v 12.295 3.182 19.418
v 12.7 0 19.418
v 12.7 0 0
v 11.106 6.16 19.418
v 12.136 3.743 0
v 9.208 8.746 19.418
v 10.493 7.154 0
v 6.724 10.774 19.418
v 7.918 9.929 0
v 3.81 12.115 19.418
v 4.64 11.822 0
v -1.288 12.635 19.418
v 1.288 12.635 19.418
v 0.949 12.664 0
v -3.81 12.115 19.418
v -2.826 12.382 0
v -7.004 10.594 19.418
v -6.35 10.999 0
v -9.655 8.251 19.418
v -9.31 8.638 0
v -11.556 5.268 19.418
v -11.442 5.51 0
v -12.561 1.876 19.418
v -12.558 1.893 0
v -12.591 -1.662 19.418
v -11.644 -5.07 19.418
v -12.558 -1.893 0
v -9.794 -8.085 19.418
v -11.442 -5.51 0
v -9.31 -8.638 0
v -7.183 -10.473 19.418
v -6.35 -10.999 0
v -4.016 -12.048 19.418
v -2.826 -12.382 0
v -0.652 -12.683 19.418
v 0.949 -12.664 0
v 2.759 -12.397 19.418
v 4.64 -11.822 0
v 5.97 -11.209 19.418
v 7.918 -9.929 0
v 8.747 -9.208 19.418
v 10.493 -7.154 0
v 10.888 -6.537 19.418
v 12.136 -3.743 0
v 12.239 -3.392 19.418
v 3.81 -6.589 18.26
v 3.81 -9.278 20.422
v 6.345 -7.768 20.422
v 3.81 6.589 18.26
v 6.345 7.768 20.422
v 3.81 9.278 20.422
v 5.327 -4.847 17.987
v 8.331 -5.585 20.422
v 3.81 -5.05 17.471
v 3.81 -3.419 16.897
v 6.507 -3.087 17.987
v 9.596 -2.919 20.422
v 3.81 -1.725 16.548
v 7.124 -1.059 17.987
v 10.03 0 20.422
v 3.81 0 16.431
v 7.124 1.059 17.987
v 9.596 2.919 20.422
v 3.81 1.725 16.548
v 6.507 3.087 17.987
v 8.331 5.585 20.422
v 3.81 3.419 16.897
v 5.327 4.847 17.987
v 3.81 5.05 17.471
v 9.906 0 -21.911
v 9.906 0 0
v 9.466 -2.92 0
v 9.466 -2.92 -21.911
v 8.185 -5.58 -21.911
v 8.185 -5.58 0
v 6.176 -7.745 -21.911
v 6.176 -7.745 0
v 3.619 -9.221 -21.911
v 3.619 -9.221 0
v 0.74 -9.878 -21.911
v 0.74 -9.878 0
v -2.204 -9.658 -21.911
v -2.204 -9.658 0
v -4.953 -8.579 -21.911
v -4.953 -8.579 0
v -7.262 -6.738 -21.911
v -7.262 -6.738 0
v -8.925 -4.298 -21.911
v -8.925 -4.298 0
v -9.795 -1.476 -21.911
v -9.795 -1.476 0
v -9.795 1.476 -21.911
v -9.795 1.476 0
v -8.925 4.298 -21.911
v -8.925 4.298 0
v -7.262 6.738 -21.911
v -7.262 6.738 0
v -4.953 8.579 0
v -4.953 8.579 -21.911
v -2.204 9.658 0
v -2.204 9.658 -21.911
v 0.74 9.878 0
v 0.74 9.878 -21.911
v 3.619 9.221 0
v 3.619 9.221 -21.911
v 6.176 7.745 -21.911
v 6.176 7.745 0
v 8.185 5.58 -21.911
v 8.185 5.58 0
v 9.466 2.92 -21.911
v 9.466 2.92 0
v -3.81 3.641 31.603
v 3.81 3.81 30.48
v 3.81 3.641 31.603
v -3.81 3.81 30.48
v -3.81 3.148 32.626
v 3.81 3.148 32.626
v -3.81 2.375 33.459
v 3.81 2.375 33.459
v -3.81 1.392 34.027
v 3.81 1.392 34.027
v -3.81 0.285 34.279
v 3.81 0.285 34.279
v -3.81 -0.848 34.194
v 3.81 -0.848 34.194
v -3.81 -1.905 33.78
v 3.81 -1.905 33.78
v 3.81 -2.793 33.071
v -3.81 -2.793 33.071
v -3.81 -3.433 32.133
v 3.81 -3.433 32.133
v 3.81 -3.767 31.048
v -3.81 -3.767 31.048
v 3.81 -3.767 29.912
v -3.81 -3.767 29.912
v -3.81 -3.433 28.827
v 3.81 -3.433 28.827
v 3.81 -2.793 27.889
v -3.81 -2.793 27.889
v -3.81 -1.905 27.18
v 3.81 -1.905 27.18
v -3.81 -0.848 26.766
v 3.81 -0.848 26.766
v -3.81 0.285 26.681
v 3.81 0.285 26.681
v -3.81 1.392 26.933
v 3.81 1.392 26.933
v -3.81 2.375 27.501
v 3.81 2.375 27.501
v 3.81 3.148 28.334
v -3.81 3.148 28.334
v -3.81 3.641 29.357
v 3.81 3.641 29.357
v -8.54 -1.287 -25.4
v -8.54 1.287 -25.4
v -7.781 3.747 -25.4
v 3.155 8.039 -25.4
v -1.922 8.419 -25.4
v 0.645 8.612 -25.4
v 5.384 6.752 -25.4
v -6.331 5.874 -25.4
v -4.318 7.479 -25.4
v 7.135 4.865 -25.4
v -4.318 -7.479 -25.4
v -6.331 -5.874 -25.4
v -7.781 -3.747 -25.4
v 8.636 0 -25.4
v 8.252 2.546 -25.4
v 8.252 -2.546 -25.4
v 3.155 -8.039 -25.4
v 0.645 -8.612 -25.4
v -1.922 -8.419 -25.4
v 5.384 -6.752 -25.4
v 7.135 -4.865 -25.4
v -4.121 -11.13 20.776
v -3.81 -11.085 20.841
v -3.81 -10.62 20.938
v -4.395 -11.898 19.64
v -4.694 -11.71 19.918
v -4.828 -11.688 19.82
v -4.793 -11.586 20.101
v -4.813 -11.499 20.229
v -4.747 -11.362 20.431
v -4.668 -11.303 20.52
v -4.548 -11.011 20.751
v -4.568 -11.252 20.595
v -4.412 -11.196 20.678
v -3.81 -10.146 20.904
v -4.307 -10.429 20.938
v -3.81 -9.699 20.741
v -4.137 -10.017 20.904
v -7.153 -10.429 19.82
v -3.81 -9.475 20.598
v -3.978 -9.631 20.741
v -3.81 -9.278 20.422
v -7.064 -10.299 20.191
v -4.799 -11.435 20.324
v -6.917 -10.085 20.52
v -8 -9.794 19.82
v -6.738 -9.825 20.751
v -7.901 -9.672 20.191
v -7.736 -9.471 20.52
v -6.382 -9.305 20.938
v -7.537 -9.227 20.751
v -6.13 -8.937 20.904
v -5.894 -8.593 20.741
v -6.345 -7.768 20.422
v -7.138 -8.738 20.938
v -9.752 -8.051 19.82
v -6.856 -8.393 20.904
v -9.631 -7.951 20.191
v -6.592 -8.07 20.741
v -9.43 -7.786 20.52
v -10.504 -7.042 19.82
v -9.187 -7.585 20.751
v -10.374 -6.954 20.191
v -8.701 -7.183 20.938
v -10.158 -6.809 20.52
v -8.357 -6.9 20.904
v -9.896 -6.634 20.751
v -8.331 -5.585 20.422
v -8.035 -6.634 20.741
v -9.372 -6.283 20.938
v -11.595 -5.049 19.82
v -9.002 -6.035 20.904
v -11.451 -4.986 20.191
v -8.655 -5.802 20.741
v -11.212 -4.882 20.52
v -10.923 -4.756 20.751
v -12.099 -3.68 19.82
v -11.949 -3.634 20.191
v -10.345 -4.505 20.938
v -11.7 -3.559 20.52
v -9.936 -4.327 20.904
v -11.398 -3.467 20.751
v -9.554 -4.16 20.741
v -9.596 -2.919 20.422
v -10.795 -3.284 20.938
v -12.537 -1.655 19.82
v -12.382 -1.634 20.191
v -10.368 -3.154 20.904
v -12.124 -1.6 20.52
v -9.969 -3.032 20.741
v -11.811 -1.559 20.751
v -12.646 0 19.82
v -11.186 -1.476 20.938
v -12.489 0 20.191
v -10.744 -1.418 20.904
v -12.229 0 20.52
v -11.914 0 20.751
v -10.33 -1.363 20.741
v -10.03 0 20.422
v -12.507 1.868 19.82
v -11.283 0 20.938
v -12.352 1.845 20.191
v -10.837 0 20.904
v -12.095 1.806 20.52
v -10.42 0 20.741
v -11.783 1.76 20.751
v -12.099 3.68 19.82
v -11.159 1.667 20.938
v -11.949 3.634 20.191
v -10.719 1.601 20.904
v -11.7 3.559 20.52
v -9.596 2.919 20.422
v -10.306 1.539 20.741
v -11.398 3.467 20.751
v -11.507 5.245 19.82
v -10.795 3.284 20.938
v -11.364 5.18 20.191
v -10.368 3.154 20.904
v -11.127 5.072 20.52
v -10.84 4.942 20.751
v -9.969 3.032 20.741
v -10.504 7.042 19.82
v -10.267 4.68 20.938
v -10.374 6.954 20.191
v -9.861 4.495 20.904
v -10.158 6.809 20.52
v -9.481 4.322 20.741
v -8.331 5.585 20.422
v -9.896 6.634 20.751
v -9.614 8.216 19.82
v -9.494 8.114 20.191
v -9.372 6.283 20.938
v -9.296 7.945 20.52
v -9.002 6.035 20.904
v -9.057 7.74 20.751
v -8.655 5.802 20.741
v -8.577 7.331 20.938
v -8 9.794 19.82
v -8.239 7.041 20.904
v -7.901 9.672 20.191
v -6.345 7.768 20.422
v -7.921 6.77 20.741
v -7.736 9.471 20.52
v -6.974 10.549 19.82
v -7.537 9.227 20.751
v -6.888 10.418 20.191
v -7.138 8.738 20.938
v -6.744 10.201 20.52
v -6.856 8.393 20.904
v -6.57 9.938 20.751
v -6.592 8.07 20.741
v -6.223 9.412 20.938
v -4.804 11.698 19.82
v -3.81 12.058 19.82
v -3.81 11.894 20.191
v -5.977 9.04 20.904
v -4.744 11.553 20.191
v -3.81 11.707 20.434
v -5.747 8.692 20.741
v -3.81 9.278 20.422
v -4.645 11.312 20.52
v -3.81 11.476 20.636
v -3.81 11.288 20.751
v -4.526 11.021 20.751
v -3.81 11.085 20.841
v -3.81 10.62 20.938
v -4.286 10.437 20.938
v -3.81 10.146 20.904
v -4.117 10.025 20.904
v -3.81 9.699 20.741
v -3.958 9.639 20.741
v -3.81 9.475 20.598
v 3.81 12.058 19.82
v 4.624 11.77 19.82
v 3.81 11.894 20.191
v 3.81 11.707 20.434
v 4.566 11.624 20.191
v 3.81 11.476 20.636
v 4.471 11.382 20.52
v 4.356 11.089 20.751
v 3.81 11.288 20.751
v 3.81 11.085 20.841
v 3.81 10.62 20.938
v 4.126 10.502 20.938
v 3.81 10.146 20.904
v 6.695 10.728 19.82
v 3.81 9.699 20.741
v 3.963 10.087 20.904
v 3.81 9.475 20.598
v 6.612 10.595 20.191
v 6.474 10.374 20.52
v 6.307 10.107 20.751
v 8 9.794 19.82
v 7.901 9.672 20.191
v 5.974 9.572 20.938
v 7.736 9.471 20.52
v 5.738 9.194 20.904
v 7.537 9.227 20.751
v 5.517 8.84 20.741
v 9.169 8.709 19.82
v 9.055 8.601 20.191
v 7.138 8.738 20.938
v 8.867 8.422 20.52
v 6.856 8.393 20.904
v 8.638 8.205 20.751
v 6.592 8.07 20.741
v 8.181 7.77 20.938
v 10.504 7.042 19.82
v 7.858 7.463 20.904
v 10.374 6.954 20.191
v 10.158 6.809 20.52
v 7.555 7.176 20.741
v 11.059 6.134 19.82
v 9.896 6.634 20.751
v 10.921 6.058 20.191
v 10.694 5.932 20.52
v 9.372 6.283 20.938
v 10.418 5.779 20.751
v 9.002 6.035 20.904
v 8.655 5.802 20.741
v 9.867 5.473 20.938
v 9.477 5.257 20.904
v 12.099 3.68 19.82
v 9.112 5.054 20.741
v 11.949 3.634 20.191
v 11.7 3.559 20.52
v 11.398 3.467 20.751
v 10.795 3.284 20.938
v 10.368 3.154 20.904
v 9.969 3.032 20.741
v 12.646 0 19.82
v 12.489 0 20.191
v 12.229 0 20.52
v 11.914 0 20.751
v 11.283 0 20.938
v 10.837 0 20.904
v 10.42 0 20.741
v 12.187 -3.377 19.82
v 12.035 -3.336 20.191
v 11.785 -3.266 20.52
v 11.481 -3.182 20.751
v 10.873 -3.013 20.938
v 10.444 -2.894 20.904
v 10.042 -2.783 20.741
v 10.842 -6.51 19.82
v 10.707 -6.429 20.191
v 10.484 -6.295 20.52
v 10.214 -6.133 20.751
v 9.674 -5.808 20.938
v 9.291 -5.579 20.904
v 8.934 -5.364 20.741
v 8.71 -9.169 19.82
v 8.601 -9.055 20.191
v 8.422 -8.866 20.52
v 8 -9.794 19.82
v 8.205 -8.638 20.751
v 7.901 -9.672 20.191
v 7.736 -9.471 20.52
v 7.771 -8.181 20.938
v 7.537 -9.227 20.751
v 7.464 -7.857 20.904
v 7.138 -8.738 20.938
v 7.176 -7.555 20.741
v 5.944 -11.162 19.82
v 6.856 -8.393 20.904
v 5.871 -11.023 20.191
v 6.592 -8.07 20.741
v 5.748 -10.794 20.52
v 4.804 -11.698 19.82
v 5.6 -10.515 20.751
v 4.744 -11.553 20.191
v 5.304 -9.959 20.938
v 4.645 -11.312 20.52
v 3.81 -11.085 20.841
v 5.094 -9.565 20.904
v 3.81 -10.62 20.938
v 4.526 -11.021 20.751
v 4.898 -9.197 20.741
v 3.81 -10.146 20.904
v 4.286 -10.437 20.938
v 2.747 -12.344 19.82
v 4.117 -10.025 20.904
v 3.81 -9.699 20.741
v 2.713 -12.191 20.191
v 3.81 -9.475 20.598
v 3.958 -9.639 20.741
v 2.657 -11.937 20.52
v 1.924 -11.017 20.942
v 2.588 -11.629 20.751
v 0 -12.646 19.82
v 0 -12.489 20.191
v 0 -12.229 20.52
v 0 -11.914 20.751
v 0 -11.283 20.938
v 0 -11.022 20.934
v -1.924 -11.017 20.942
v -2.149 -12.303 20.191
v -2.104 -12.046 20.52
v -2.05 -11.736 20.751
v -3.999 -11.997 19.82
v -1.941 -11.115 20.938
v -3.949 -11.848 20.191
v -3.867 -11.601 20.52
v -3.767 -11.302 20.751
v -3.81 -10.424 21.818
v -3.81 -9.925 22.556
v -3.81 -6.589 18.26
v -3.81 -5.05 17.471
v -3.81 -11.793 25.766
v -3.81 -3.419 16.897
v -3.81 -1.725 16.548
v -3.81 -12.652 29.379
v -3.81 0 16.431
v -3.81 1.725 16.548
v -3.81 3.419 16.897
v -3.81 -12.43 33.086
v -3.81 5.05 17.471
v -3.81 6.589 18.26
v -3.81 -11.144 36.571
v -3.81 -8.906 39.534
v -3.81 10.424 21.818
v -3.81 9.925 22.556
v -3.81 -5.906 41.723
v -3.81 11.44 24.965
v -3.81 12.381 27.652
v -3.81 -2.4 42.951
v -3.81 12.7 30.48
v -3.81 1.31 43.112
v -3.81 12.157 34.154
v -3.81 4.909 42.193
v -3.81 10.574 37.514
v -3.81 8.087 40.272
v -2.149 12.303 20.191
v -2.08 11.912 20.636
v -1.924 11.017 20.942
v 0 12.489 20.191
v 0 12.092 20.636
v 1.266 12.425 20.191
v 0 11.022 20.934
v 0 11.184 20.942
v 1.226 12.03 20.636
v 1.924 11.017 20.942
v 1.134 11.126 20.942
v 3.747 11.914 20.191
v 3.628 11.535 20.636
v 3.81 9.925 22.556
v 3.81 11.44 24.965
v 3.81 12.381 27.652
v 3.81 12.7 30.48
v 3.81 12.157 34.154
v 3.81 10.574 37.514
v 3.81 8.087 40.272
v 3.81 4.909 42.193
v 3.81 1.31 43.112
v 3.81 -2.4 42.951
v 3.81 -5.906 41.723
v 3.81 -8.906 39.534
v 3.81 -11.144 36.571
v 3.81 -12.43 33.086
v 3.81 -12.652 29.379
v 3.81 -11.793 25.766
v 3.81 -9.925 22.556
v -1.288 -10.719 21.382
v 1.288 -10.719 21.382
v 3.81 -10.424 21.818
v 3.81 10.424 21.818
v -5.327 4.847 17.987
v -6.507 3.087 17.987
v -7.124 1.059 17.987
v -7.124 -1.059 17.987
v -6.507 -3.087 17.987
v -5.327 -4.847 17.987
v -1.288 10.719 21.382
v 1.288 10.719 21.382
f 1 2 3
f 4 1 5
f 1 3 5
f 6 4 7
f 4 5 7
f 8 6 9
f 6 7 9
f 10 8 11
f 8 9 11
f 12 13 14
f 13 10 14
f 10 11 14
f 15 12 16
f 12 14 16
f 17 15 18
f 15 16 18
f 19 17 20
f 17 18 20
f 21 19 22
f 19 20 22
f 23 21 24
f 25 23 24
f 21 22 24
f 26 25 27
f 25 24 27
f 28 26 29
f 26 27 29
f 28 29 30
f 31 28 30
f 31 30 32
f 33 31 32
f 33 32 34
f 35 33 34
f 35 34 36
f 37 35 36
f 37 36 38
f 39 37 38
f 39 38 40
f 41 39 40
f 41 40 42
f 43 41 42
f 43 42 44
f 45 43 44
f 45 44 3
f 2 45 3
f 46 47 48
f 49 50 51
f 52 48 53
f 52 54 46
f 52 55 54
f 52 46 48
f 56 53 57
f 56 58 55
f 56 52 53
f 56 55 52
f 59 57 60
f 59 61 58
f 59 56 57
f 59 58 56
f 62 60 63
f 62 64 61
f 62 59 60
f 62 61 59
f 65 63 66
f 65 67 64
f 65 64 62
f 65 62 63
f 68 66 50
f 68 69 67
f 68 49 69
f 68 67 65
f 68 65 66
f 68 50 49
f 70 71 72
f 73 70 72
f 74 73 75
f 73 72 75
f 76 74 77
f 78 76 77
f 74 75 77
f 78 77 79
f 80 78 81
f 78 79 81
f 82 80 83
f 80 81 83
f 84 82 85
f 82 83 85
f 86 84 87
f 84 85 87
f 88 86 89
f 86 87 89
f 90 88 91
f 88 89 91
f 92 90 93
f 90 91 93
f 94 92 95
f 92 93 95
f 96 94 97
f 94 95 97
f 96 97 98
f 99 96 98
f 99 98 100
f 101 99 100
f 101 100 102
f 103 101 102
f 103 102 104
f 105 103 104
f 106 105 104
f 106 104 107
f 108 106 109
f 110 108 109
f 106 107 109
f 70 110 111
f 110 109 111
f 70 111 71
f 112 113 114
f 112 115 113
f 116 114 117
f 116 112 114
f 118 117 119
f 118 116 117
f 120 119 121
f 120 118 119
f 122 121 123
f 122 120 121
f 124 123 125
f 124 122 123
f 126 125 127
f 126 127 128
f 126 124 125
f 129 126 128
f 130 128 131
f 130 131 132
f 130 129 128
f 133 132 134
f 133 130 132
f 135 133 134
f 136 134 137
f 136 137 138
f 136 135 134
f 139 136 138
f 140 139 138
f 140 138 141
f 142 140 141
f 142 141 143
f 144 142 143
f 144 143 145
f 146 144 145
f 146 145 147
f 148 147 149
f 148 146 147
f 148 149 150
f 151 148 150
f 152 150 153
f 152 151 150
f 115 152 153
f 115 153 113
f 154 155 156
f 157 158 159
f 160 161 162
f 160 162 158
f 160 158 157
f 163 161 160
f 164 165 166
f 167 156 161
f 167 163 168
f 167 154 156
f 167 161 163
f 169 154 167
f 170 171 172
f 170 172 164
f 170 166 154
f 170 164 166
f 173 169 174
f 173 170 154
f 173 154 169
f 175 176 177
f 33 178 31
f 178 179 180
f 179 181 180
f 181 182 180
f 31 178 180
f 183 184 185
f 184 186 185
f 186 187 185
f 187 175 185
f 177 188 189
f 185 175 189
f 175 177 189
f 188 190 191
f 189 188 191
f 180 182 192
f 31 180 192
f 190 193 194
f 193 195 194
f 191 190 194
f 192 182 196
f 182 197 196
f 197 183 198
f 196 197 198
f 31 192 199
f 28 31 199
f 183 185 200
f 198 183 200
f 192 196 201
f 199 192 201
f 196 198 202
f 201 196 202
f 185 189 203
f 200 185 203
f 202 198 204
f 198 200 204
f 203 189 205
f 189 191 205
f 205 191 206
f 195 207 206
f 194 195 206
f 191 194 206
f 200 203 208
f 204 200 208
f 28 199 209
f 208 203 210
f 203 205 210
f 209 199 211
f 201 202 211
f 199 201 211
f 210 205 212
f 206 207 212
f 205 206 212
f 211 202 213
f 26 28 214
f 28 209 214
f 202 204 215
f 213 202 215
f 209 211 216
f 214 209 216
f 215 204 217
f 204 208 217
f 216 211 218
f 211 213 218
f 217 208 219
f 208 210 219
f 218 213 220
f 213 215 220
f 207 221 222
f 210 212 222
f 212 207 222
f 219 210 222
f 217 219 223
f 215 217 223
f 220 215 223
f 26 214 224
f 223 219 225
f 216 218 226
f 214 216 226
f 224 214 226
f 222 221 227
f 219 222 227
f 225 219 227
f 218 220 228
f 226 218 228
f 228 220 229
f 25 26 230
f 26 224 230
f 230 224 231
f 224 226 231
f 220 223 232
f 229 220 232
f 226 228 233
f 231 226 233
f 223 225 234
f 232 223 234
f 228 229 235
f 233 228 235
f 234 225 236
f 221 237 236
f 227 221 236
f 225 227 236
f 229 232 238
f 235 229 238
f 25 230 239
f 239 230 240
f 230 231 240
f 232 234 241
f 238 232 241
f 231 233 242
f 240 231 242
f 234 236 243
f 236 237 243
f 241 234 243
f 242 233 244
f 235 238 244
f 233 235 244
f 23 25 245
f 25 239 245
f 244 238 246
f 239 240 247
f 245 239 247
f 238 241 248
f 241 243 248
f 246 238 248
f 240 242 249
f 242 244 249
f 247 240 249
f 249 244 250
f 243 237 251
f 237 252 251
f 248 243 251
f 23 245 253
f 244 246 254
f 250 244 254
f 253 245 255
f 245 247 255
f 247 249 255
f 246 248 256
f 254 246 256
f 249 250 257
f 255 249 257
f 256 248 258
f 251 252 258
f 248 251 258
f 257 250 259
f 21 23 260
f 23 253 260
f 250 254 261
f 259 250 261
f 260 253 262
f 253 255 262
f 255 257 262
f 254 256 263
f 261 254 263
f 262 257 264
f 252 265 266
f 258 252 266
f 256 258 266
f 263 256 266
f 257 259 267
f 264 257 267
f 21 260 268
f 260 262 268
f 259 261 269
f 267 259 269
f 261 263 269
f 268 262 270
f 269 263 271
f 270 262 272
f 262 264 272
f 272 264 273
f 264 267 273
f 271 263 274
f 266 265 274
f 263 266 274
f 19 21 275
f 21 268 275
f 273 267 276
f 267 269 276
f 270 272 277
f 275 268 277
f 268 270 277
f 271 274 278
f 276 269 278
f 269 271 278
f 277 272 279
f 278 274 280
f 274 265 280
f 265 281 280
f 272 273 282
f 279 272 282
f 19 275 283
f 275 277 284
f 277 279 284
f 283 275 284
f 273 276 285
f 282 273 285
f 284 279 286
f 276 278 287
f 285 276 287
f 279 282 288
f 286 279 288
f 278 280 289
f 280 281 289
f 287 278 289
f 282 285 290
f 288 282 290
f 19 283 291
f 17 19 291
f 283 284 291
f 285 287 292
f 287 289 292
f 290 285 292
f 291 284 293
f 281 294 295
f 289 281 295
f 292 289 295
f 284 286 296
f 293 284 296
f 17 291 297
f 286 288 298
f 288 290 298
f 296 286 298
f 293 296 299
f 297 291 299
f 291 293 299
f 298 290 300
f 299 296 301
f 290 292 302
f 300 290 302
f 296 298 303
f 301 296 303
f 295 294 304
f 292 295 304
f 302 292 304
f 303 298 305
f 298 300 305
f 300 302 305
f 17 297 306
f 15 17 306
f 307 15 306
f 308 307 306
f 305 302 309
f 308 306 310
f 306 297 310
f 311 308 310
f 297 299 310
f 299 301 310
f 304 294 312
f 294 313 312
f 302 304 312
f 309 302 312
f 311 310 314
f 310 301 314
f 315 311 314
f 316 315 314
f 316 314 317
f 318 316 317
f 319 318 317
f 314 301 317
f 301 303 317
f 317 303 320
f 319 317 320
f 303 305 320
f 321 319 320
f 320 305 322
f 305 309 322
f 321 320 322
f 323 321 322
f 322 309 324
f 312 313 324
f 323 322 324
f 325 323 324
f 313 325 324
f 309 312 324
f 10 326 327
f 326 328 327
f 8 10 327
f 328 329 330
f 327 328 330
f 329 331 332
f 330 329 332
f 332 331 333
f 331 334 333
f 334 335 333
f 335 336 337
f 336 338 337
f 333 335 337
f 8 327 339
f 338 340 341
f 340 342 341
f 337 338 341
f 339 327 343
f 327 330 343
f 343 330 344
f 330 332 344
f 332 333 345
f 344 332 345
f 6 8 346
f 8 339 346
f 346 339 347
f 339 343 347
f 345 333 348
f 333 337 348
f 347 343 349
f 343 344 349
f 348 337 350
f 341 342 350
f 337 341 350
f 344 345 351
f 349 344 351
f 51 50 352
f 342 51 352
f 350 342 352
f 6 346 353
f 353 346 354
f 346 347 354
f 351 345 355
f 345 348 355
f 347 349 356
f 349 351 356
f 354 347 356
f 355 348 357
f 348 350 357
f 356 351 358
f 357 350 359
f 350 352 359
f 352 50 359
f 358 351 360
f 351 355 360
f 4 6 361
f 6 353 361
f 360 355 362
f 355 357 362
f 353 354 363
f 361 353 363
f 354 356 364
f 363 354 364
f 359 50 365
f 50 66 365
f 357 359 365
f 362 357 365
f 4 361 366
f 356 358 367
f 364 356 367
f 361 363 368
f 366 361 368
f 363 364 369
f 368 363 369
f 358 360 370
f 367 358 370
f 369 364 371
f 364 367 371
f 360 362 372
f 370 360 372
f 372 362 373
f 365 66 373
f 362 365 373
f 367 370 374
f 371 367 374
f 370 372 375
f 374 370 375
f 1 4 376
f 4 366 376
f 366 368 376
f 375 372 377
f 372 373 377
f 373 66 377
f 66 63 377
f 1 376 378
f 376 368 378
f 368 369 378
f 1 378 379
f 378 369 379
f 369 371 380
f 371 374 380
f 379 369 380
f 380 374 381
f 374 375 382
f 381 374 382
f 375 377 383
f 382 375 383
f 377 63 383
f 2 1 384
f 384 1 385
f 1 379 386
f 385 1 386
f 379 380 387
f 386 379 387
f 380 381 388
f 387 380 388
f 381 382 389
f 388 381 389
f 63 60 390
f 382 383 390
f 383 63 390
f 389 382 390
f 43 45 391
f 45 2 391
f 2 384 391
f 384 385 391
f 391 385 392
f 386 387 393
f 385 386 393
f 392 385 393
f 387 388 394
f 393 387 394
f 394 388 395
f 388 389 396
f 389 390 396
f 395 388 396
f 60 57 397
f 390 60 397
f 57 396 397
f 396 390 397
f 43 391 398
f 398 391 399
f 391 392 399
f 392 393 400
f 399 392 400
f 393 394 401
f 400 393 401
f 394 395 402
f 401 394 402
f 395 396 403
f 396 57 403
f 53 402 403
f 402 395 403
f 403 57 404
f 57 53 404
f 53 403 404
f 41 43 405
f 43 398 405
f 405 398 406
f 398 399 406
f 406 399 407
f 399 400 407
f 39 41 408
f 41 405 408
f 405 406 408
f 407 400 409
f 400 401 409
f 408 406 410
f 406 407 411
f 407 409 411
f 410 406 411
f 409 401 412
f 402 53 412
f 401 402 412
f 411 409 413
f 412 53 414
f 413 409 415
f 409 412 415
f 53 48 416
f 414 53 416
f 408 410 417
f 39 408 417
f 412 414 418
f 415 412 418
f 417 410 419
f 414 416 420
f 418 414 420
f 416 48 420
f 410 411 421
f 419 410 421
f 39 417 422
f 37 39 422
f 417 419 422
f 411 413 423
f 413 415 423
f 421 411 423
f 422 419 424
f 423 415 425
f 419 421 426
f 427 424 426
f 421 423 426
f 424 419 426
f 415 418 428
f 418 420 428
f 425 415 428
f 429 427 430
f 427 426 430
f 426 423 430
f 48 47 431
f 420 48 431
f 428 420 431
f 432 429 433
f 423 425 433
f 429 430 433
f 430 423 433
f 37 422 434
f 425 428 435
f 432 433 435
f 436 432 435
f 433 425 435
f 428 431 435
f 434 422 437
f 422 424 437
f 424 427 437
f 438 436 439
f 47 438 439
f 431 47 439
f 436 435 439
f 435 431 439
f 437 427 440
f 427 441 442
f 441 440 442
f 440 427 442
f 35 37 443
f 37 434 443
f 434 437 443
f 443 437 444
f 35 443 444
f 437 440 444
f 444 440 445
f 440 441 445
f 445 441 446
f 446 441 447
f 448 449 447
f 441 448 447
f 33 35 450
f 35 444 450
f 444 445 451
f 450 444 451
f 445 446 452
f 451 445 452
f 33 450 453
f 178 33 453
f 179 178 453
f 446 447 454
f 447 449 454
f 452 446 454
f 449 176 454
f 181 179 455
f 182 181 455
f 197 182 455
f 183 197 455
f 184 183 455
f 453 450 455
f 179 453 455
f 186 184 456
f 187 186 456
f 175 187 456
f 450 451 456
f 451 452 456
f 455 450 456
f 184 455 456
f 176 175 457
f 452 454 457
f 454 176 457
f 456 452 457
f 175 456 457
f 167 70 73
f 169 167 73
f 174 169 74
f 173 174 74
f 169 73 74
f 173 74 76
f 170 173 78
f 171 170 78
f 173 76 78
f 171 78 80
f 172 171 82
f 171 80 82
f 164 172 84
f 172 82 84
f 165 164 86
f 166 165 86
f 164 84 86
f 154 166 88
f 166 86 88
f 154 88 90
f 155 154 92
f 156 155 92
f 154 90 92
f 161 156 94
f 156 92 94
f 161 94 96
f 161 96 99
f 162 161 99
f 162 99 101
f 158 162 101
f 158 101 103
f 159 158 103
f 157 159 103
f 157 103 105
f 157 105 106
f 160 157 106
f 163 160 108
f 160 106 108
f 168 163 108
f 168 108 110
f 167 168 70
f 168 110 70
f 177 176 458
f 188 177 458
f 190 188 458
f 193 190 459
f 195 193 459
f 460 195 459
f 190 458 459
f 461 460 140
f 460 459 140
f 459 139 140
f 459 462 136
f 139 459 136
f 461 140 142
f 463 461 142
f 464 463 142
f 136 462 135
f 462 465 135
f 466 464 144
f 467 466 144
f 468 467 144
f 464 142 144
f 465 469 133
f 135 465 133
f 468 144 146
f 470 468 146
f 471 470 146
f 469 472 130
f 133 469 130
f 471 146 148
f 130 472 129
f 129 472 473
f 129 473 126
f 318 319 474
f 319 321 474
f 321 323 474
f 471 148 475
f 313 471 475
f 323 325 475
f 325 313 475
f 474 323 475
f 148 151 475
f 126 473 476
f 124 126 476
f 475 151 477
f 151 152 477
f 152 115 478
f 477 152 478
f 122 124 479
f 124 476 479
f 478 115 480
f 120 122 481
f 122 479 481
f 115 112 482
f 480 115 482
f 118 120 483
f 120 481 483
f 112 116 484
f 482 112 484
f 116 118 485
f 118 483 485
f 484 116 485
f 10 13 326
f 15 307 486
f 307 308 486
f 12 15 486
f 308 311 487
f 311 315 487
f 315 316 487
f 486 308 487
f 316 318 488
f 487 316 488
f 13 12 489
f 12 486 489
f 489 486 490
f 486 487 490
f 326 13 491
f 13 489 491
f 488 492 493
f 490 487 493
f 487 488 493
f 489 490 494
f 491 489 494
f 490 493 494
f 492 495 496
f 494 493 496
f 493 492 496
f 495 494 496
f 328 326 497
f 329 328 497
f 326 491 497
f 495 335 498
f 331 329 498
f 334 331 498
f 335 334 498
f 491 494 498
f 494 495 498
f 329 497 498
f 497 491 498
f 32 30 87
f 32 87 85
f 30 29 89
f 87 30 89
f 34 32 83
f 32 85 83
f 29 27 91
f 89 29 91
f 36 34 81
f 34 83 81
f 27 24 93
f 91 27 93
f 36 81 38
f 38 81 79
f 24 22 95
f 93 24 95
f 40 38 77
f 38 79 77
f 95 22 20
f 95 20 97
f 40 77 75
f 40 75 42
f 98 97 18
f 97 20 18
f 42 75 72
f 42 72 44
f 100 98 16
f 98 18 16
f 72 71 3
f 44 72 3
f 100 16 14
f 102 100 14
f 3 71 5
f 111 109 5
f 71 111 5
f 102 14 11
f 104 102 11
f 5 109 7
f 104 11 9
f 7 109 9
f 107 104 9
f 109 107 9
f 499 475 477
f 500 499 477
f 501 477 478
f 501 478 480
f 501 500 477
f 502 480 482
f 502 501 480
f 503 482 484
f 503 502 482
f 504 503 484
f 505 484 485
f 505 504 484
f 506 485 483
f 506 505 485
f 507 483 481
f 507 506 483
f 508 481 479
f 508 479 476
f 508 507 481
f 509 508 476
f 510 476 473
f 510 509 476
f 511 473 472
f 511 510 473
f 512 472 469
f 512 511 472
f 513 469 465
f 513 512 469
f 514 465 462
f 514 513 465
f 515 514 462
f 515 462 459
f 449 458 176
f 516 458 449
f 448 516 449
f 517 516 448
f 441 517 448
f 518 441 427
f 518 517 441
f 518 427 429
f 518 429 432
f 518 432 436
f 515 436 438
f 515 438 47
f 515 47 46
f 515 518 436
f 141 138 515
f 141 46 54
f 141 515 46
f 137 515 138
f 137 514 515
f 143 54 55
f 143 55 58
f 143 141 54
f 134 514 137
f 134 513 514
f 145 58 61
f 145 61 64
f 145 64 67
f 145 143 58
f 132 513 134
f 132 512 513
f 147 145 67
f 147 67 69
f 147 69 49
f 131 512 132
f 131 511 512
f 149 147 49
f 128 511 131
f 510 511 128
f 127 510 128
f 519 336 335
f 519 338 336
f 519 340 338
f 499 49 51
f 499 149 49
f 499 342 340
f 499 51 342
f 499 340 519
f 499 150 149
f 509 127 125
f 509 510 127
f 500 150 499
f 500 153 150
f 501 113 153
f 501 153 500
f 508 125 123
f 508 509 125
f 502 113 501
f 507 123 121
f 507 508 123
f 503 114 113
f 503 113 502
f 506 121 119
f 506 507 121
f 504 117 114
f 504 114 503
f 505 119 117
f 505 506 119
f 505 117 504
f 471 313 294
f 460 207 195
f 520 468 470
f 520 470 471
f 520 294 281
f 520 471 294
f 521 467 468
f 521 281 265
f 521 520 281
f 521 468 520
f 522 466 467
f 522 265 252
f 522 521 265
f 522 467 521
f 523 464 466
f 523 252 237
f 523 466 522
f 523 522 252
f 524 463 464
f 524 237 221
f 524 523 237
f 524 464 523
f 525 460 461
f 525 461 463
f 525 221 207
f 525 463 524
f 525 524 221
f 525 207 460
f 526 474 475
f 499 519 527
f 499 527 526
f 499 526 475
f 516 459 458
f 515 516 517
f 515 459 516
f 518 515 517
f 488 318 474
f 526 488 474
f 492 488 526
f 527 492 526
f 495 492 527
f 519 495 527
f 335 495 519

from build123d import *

# Parameters (mm, degrees)
F0_R         = 12.7
F1_DEPTH     = 25.4
F4_R         = 3.81
F5_DEPTH     = 3.81
F6_T4_ANGLE  = 90
F6_T9_ANGLE  = 90
F6_T14_ANGLE = 270
F6_T19_ANGLE = 270
F6_T24_ANGLE = 270
F6_T29_ANGLE = 270
F7_R         = 9.906
F8_DEPTH     = 25.4
F9_SIZE2     = 3.4892963227
F9_SIZE      = 1.27


# Not quite as in the source:
# - a fillet or chamfer that OpenCascade refuses, or shapes differently, is made with other operations: its cross-section is extruded or revolved along the edge and cut away or added


with BuildPart() as f1:
    # F0 (on Top) → F1 (new body)
    with BuildSketch(Plane.XY):
        Circle(F0_R)
    extrude(amount=F1_DEPTH)

    # F2 (on Right) → F3 (revolve, cut)
    with BuildSketch(Plane.YZ):
        with BuildLine():
            Line((0, 15.875), (0, 42.545))
            ThreePointArc((0, 42.545), (-13.335, 29.21), (0, 15.875))
        make_face()
    revolve(axis=Axis((0, 0, 25.198931613), (0, 0, 1)), mode=Mode.SUBTRACT)

    # F4 (on Right) → F5 (join, symmetric)
    with BuildSketch(Plane.YZ):
        with BuildLine():
            ThreePointArc((9.9246541198, 22.5559075849), (11.9860983502, 26.2819711364), (12.7, 30.48))
            ThreePointArc((12.7, 30.48), (-4.1980288636, 42.4660983502), (-9.9246541198, 22.5559075849))
            ThreePointArc((-9.9246541198, 22.5559075849), (0, 17.78), (9.9246541198, 22.5559075849))
        make_face()
        with Locations((0, 30.48)):
            Circle(F4_R, mode=Mode.SUBTRACT)
        with BuildLine():
            ThreePointArc((9.9246541198, 22.5559075849), (0, 17.78), (-9.9246541198, 22.5559075849))
            Line((-9.9246541198, 22.5559075849), (-12.0323663577, 19.4415319711))
            ThreePointArc((-12.0323663577, 19.4415319711), (-6.795833015, 14.9780300529), (0, 13.9006329783))
            ThreePointArc((0, 13.9006329783), (6.795833015, 14.9780300529), (12.0323663577, 19.4415319711))
            Line((12.0323663577, 19.4415319711), (9.9246541198, 22.5559075849))
        make_face()
    extrude(amount=F5_DEPTH, both=True)

    # F6: fillet of radius 1.524 on 2 edges, made by hand


with BuildPart() as f6_tool2:
    # F6_s3 → F6_t4 (revolve)
    with BuildSketch(Plane.XZ):
        with BuildLine():
            ThreePointArc((12.7, 19.4178140847), (11.7125077962, 20.8442555958), (10.0297435897, 20.4221408452))
            ThreePointArc((10.0297435897, 20.4221408452), (11.6075121114, 22.645863531), (12.7, 25.1440161092))
            Line((12.7, 25.1440161092), (12.7, 19.4178140847))
        make_face()
    revolve(axis=Axis((0, 0, 25.1440161092), (0, 0, -1)), revolution_arc=F6_T4_ANGLE)

    split(bisect_by=Plane.YZ.offset(3.81), keep=Keep.TOP)


with BuildPart() as f1_1:
    add(f1.part)

    # F6_t1: cut F6_tool2
    add(f6_tool2.part, mode=Mode.SUBTRACT)


with BuildPart() as f6_tool7:
    # F6_s8 → F6_t9 (revolve)
    with BuildSketch(Plane.XZ):
        with BuildLine():
            ThreePointArc((12.7, 19.4178140847), (11.7125077962, 20.8442555958), (10.0297435897, 20.4221408452))
            ThreePointArc((10.0297435897, 20.4221408452), (11.6075121114, 22.645863531), (12.7, 25.1440161092))
            Line((12.7, 25.1440161092), (12.7, 19.4178140847))
        make_face()
    revolve(axis=Axis((0, 0, 25.1440161092), (0, 0, -1)), revolution_arc=F6_T9_ANGLE)

    split(bisect_by=Plane(origin=(0, -17.2767572385, 11.6923702143), x_dir=(1, 0, 0), z_dir=(0, -0.8281687795, 0.5604787887)), keep=Keep.TOP)


with BuildPart() as f1_2:
    add(f1_1.part)

    # F6_t6: cut F6_tool7
    add(f6_tool7.part, mode=Mode.SUBTRACT)


with BuildPart() as f6_tool12:
    # F6_s13 → F6_t14 (revolve)
    with BuildSketch(Plane.YZ):
        with BuildLine():
            ThreePointArc((-12.7, 19.4178140847), (-11.7125077962, 20.8442555958), (-10.0297435897, 20.4221408452))
            ThreePointArc((-10.0297435897, 20.4221408452), (-11.6075121114, 22.645863531), (-12.7, 25.1440161092))
            Line((-12.7, 25.1440161092), (-12.7, 19.4178140847))
        make_face()
    revolve(axis=Axis((0, 0, 25.1440161092), (0, 0, -1)), revolution_arc=F6_T14_ANGLE)

    split(bisect_by=Plane(origin=(0, -17.2767572385, 11.6923702143), x_dir=(1, 0, 0), z_dir=(0, -0.8281687795, 0.5604787887)), keep=Keep.TOP)


with BuildPart() as f1_3:
    add(f1_2.part)

    # F6_t11: cut F6_tool12
    add(f6_tool12.part, mode=Mode.SUBTRACT)


with BuildPart() as f6_tool17:
    # F6_s18 → F6_t19 (revolve)
    with BuildSketch(Plane.YZ):
        with BuildLine():
            ThreePointArc((-12.7, 19.4178140847), (-11.7125077962, 20.8442555958), (-10.0297435897, 20.4221408452))
            ThreePointArc((-10.0297435897, 20.4221408452), (-11.6075121114, 22.645863531), (-12.7, 25.1440161092))
            Line((-12.7, 25.1440161092), (-12.7, 19.4178140847))
        make_face()
    revolve(axis=Axis((0, 0, 25.1440161092), (0, 0, -1)), revolution_arc=F6_T19_ANGLE)

    split(bisect_by=Plane.YZ.offset(-3.81), keep=Keep.BOTTOM)


with BuildPart() as f1_4:
    add(f1_3.part)

    # F6_t16: cut F6_tool17
    add(f6_tool17.part, mode=Mode.SUBTRACT)


with BuildPart() as f6_tool22:
    # F6_s23 → F6_t24 (revolve)
    with BuildSketch(Plane.YZ):
        with BuildLine():
            ThreePointArc((-12.7, 19.4178140847), (-11.7125077962, 20.8442555958), (-10.0297435897, 20.4221408452))
            ThreePointArc((-10.0297435897, 20.4221408452), (-11.6075121114, 22.645863531), (-12.7, 25.1440161092))
            Line((-12.7, 25.1440161092), (-12.7, 19.4178140847))
        make_face()
    revolve(axis=Axis((0, 0, 25.1440161092), (0, 0, -1)), revolution_arc=F6_T24_ANGLE)

    split(bisect_by=Plane.YZ.offset(3.81), keep=Keep.TOP)


with BuildPart() as f1_5:
    add(f1_4.part)

    # F6_t21: cut F6_tool22
    add(f6_tool22.part, mode=Mode.SUBTRACT)


with BuildPart() as f6_tool27:
    # F6_s28 → F6_t29 (revolve)
    with BuildSketch(Plane.YZ):
        with BuildLine():
            ThreePointArc((-12.7, 19.4178140847), (-11.7125077962, 20.8442555958), (-10.0297435897, 20.4221408452))
            ThreePointArc((-10.0297435897, 20.4221408452), (-11.6075121114, 22.645863531), (-12.7, 25.1440161092))
            Line((-12.7, 25.1440161092), (-12.7, 19.4178140847))
        make_face()
    revolve(axis=Axis((0, 0, 25.1440161092), (0, 0, -1)), revolution_arc=F6_T29_ANGLE)

    split(bisect_by=Plane(origin=(0, 17.2767572385, 11.6923702143), x_dir=(1, 0, 0), z_dir=(0, 0.8281687795, 0.5604787887)), keep=Keep.TOP)


with BuildPart() as f1_6:
    add(f1_5.part)

    # F6_t26: cut F6_tool27
    add(f6_tool27.part, mode=Mode.SUBTRACT)

    # F7 (on face) → F8 (join)
    with BuildSketch(Plane(origin=(0, 0, 0), x_dir=(1, 0, 0), z_dir=(0, 0, -1))):
        Circle(F7_R)
    extrude(amount=F8_DEPTH)

    # F9
    f9_edges = [f1_6.edges().sort_by_distance(p)[0] for p in [
        (-9.906, 0, -25.4),
    ]]
    f9_side = f1_6.faces().sort_by_distance((0, 0, -25.4))[0]
    chamfer(f9_edges, length=F9_SIZE, length2=F9_SIZE2, reference=f9_side)


solid = f1_6.part
